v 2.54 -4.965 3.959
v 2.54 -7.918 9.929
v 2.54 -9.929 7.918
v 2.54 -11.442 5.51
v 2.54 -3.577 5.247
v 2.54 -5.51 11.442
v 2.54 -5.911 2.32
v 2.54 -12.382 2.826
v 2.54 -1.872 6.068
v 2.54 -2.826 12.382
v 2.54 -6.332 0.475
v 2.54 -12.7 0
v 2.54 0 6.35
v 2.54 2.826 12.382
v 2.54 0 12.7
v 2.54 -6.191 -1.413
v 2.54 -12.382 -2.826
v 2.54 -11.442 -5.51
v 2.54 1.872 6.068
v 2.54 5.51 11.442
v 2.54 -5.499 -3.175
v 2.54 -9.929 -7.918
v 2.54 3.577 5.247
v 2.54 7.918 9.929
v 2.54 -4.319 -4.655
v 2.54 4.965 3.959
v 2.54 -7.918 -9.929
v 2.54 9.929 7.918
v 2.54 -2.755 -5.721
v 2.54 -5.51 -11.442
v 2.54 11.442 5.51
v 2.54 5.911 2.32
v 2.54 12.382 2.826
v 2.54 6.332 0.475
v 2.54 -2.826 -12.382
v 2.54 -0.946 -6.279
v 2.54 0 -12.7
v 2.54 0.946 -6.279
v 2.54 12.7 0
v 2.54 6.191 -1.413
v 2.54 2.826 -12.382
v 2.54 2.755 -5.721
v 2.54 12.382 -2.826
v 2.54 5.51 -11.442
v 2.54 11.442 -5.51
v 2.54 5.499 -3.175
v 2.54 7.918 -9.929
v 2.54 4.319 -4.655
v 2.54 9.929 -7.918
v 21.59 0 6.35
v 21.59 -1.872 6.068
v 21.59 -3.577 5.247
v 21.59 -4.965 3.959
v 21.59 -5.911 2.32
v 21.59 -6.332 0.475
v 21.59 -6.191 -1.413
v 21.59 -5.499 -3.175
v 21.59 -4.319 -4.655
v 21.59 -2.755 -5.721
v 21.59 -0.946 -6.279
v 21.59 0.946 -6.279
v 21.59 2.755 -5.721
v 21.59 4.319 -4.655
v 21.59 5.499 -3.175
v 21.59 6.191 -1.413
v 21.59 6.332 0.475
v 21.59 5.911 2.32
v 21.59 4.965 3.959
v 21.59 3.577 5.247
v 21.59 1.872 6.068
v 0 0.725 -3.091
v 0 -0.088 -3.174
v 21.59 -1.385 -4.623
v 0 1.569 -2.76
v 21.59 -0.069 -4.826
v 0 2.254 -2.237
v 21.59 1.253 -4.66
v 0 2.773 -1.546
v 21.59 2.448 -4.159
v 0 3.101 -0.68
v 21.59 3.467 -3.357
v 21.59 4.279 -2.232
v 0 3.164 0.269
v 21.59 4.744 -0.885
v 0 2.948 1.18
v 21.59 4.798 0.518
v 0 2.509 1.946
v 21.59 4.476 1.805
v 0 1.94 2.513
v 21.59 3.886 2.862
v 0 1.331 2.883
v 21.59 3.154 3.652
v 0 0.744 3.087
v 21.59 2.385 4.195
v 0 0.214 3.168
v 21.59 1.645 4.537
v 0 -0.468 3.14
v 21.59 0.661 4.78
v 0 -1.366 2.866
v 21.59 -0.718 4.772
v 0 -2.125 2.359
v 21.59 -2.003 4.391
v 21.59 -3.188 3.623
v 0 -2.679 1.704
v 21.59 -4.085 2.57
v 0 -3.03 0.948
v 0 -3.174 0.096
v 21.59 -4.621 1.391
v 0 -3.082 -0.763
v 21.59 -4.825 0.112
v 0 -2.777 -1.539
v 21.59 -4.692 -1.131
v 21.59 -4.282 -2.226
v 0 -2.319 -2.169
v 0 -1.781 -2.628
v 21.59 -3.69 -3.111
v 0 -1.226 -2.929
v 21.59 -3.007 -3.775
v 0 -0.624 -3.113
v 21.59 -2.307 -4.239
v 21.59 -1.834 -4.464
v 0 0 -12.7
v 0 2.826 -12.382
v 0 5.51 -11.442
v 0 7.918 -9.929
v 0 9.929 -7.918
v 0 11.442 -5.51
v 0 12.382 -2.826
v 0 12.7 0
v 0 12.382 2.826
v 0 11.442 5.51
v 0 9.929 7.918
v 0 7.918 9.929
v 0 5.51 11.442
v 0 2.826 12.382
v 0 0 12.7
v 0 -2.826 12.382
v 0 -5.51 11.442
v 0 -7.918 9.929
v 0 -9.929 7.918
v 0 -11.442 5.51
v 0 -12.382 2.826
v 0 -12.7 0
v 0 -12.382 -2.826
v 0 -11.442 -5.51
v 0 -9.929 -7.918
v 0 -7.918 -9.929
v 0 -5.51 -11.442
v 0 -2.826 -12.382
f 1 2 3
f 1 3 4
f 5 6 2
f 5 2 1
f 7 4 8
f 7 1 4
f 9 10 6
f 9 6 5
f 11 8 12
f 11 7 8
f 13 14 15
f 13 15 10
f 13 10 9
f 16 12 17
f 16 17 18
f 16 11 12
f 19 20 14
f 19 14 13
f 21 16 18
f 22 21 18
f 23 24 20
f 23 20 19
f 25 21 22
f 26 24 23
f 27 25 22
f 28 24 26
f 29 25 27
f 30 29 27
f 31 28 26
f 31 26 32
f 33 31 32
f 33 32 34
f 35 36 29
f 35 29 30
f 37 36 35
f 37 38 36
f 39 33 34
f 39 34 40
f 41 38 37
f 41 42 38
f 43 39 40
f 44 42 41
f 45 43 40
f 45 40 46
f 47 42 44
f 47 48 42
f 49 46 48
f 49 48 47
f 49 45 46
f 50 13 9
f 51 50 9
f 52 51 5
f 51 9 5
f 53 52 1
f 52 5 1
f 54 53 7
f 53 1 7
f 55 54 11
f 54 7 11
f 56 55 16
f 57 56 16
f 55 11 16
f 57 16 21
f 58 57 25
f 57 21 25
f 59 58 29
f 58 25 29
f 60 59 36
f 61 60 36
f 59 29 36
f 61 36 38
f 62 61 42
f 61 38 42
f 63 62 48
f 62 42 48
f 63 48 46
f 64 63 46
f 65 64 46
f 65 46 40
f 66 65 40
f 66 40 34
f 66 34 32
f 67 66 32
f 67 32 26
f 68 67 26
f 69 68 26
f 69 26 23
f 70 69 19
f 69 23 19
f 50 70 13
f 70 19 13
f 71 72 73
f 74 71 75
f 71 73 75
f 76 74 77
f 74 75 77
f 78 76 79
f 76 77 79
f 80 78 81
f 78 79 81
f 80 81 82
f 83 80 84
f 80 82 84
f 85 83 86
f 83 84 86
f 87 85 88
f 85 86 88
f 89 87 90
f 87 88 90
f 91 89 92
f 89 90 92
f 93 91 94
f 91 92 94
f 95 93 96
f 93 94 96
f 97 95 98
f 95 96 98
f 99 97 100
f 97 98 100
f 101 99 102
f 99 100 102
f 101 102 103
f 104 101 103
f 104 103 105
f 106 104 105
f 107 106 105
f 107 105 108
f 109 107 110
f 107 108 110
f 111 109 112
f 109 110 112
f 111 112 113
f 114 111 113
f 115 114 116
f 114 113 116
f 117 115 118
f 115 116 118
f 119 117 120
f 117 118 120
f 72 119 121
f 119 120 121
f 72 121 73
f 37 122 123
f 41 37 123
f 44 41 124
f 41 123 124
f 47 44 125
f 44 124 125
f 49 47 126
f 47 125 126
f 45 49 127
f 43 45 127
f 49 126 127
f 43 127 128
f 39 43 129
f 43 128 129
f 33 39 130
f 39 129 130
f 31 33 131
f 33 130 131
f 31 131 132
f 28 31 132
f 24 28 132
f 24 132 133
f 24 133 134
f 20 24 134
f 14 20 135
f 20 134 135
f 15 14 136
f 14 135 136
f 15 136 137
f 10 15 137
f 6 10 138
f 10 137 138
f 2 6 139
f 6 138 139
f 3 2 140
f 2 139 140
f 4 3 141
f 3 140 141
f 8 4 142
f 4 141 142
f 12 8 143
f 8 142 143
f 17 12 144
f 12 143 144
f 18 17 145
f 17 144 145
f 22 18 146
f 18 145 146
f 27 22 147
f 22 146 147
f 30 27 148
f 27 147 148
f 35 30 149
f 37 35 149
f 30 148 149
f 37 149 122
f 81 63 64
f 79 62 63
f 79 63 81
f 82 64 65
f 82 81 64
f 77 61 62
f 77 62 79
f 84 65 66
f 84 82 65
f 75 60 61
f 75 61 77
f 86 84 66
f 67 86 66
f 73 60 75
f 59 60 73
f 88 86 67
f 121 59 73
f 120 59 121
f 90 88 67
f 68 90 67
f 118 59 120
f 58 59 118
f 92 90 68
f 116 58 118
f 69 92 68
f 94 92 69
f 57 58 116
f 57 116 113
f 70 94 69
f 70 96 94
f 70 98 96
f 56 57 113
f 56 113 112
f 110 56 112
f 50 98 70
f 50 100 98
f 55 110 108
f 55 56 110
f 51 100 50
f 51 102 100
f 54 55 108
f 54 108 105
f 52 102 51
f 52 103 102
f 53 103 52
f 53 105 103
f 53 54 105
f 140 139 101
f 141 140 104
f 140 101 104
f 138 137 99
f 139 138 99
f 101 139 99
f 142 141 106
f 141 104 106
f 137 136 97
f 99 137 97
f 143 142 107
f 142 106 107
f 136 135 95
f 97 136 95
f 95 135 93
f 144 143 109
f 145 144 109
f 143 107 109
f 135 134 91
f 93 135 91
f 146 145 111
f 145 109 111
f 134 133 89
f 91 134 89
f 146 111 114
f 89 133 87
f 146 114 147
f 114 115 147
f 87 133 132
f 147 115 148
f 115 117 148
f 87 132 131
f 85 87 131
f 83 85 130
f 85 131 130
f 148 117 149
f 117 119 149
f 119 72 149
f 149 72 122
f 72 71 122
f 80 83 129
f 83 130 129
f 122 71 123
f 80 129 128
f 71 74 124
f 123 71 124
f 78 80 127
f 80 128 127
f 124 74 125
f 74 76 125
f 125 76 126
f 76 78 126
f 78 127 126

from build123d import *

# Parameters (mm, degrees)
SKETCH1_R           = 12.7
BOSS_EXTRUDE1_DEPTH = 2.54
SKETCH2_R           = 6.35
BOSS_EXTRUDE2_DEPTH = 19.05


with BuildPart() as part:
    # Sketch1 → Boss-Extrude1 (new body)
    with BuildSketch(Plane(origin=(0, 0, 0), x_dir=(0, 0, -1), z_dir=(1, 0, 0))):
        Circle(SKETCH1_R)
    extrude(amount=BOSS_EXTRUDE1_DEPTH)

    # Sketch2 → Boss-Extrude2 (add)
    with BuildSketch(Plane(origin=(2.54, 0, 0), x_dir=(0, 0, -1), z_dir=(1, 0, 0))):
        with Locations(Location((0, 0, 0), (0, 0, 180))):
            Circle(SKETCH2_R)
    extrude(amount=BOSS_EXTRUDE2_DEPTH)

    # Cut-Loft1: read off the stored shape, not the designer's step
    # Cut-Loft1: loft between two sections, ruled curve by curve
    cut_loft1_from = [
        Edge.make_bspline([(0, -0.087914937, -3.173782596), (0, 6.259650254, -3.34961247), (0, 6.435480128, 2.997952721), (0, 0.087914937, 3.173782596), (0, -6.259650254, 3.34961247), (0, -6.435480128, -2.997952721), (0, -0.087914937, -3.173782596)], [0, 0, 0, 0, 0.5, 0.5, 0.5, 1, 1, 1, 1], 3, [1, 0.333333333, 0.333333333, 1, 0.333333333, 0.333333333, 1]),
    ]
    cut_loft1_to = [
        Edge.make_bspline([(21.59, -1.385331043, -4.622892374), (21.59, 7.860453704, -7.393554461), (21.59, 10.631115791, 1.852230287), (21.59, 1.385331043, 4.622892374), (21.59, -7.860453704, 7.393554461), (21.59, -10.631115791, -1.852230287), (21.59, -1.385331043, -4.622892374)], [0, 0, 0, 0, 0.5, 0.5, 0.5, 1, 1, 1, 1], 3, [1, 0.333333333, 0.333333333, 1, 0.333333333, 0.333333333, 1]),
    ]
    cut_loft1 = Solid(Shell([*[Face.make_surface_from_curves(cut_loft1_from[k], cut_loft1_to[k]) for k in range(1)], Face(Wire(cut_loft1_from)), Face(Wire(cut_loft1_to))]))
    add(cut_loft1, mode=Mode.SUBTRACT)


solid = part.part
